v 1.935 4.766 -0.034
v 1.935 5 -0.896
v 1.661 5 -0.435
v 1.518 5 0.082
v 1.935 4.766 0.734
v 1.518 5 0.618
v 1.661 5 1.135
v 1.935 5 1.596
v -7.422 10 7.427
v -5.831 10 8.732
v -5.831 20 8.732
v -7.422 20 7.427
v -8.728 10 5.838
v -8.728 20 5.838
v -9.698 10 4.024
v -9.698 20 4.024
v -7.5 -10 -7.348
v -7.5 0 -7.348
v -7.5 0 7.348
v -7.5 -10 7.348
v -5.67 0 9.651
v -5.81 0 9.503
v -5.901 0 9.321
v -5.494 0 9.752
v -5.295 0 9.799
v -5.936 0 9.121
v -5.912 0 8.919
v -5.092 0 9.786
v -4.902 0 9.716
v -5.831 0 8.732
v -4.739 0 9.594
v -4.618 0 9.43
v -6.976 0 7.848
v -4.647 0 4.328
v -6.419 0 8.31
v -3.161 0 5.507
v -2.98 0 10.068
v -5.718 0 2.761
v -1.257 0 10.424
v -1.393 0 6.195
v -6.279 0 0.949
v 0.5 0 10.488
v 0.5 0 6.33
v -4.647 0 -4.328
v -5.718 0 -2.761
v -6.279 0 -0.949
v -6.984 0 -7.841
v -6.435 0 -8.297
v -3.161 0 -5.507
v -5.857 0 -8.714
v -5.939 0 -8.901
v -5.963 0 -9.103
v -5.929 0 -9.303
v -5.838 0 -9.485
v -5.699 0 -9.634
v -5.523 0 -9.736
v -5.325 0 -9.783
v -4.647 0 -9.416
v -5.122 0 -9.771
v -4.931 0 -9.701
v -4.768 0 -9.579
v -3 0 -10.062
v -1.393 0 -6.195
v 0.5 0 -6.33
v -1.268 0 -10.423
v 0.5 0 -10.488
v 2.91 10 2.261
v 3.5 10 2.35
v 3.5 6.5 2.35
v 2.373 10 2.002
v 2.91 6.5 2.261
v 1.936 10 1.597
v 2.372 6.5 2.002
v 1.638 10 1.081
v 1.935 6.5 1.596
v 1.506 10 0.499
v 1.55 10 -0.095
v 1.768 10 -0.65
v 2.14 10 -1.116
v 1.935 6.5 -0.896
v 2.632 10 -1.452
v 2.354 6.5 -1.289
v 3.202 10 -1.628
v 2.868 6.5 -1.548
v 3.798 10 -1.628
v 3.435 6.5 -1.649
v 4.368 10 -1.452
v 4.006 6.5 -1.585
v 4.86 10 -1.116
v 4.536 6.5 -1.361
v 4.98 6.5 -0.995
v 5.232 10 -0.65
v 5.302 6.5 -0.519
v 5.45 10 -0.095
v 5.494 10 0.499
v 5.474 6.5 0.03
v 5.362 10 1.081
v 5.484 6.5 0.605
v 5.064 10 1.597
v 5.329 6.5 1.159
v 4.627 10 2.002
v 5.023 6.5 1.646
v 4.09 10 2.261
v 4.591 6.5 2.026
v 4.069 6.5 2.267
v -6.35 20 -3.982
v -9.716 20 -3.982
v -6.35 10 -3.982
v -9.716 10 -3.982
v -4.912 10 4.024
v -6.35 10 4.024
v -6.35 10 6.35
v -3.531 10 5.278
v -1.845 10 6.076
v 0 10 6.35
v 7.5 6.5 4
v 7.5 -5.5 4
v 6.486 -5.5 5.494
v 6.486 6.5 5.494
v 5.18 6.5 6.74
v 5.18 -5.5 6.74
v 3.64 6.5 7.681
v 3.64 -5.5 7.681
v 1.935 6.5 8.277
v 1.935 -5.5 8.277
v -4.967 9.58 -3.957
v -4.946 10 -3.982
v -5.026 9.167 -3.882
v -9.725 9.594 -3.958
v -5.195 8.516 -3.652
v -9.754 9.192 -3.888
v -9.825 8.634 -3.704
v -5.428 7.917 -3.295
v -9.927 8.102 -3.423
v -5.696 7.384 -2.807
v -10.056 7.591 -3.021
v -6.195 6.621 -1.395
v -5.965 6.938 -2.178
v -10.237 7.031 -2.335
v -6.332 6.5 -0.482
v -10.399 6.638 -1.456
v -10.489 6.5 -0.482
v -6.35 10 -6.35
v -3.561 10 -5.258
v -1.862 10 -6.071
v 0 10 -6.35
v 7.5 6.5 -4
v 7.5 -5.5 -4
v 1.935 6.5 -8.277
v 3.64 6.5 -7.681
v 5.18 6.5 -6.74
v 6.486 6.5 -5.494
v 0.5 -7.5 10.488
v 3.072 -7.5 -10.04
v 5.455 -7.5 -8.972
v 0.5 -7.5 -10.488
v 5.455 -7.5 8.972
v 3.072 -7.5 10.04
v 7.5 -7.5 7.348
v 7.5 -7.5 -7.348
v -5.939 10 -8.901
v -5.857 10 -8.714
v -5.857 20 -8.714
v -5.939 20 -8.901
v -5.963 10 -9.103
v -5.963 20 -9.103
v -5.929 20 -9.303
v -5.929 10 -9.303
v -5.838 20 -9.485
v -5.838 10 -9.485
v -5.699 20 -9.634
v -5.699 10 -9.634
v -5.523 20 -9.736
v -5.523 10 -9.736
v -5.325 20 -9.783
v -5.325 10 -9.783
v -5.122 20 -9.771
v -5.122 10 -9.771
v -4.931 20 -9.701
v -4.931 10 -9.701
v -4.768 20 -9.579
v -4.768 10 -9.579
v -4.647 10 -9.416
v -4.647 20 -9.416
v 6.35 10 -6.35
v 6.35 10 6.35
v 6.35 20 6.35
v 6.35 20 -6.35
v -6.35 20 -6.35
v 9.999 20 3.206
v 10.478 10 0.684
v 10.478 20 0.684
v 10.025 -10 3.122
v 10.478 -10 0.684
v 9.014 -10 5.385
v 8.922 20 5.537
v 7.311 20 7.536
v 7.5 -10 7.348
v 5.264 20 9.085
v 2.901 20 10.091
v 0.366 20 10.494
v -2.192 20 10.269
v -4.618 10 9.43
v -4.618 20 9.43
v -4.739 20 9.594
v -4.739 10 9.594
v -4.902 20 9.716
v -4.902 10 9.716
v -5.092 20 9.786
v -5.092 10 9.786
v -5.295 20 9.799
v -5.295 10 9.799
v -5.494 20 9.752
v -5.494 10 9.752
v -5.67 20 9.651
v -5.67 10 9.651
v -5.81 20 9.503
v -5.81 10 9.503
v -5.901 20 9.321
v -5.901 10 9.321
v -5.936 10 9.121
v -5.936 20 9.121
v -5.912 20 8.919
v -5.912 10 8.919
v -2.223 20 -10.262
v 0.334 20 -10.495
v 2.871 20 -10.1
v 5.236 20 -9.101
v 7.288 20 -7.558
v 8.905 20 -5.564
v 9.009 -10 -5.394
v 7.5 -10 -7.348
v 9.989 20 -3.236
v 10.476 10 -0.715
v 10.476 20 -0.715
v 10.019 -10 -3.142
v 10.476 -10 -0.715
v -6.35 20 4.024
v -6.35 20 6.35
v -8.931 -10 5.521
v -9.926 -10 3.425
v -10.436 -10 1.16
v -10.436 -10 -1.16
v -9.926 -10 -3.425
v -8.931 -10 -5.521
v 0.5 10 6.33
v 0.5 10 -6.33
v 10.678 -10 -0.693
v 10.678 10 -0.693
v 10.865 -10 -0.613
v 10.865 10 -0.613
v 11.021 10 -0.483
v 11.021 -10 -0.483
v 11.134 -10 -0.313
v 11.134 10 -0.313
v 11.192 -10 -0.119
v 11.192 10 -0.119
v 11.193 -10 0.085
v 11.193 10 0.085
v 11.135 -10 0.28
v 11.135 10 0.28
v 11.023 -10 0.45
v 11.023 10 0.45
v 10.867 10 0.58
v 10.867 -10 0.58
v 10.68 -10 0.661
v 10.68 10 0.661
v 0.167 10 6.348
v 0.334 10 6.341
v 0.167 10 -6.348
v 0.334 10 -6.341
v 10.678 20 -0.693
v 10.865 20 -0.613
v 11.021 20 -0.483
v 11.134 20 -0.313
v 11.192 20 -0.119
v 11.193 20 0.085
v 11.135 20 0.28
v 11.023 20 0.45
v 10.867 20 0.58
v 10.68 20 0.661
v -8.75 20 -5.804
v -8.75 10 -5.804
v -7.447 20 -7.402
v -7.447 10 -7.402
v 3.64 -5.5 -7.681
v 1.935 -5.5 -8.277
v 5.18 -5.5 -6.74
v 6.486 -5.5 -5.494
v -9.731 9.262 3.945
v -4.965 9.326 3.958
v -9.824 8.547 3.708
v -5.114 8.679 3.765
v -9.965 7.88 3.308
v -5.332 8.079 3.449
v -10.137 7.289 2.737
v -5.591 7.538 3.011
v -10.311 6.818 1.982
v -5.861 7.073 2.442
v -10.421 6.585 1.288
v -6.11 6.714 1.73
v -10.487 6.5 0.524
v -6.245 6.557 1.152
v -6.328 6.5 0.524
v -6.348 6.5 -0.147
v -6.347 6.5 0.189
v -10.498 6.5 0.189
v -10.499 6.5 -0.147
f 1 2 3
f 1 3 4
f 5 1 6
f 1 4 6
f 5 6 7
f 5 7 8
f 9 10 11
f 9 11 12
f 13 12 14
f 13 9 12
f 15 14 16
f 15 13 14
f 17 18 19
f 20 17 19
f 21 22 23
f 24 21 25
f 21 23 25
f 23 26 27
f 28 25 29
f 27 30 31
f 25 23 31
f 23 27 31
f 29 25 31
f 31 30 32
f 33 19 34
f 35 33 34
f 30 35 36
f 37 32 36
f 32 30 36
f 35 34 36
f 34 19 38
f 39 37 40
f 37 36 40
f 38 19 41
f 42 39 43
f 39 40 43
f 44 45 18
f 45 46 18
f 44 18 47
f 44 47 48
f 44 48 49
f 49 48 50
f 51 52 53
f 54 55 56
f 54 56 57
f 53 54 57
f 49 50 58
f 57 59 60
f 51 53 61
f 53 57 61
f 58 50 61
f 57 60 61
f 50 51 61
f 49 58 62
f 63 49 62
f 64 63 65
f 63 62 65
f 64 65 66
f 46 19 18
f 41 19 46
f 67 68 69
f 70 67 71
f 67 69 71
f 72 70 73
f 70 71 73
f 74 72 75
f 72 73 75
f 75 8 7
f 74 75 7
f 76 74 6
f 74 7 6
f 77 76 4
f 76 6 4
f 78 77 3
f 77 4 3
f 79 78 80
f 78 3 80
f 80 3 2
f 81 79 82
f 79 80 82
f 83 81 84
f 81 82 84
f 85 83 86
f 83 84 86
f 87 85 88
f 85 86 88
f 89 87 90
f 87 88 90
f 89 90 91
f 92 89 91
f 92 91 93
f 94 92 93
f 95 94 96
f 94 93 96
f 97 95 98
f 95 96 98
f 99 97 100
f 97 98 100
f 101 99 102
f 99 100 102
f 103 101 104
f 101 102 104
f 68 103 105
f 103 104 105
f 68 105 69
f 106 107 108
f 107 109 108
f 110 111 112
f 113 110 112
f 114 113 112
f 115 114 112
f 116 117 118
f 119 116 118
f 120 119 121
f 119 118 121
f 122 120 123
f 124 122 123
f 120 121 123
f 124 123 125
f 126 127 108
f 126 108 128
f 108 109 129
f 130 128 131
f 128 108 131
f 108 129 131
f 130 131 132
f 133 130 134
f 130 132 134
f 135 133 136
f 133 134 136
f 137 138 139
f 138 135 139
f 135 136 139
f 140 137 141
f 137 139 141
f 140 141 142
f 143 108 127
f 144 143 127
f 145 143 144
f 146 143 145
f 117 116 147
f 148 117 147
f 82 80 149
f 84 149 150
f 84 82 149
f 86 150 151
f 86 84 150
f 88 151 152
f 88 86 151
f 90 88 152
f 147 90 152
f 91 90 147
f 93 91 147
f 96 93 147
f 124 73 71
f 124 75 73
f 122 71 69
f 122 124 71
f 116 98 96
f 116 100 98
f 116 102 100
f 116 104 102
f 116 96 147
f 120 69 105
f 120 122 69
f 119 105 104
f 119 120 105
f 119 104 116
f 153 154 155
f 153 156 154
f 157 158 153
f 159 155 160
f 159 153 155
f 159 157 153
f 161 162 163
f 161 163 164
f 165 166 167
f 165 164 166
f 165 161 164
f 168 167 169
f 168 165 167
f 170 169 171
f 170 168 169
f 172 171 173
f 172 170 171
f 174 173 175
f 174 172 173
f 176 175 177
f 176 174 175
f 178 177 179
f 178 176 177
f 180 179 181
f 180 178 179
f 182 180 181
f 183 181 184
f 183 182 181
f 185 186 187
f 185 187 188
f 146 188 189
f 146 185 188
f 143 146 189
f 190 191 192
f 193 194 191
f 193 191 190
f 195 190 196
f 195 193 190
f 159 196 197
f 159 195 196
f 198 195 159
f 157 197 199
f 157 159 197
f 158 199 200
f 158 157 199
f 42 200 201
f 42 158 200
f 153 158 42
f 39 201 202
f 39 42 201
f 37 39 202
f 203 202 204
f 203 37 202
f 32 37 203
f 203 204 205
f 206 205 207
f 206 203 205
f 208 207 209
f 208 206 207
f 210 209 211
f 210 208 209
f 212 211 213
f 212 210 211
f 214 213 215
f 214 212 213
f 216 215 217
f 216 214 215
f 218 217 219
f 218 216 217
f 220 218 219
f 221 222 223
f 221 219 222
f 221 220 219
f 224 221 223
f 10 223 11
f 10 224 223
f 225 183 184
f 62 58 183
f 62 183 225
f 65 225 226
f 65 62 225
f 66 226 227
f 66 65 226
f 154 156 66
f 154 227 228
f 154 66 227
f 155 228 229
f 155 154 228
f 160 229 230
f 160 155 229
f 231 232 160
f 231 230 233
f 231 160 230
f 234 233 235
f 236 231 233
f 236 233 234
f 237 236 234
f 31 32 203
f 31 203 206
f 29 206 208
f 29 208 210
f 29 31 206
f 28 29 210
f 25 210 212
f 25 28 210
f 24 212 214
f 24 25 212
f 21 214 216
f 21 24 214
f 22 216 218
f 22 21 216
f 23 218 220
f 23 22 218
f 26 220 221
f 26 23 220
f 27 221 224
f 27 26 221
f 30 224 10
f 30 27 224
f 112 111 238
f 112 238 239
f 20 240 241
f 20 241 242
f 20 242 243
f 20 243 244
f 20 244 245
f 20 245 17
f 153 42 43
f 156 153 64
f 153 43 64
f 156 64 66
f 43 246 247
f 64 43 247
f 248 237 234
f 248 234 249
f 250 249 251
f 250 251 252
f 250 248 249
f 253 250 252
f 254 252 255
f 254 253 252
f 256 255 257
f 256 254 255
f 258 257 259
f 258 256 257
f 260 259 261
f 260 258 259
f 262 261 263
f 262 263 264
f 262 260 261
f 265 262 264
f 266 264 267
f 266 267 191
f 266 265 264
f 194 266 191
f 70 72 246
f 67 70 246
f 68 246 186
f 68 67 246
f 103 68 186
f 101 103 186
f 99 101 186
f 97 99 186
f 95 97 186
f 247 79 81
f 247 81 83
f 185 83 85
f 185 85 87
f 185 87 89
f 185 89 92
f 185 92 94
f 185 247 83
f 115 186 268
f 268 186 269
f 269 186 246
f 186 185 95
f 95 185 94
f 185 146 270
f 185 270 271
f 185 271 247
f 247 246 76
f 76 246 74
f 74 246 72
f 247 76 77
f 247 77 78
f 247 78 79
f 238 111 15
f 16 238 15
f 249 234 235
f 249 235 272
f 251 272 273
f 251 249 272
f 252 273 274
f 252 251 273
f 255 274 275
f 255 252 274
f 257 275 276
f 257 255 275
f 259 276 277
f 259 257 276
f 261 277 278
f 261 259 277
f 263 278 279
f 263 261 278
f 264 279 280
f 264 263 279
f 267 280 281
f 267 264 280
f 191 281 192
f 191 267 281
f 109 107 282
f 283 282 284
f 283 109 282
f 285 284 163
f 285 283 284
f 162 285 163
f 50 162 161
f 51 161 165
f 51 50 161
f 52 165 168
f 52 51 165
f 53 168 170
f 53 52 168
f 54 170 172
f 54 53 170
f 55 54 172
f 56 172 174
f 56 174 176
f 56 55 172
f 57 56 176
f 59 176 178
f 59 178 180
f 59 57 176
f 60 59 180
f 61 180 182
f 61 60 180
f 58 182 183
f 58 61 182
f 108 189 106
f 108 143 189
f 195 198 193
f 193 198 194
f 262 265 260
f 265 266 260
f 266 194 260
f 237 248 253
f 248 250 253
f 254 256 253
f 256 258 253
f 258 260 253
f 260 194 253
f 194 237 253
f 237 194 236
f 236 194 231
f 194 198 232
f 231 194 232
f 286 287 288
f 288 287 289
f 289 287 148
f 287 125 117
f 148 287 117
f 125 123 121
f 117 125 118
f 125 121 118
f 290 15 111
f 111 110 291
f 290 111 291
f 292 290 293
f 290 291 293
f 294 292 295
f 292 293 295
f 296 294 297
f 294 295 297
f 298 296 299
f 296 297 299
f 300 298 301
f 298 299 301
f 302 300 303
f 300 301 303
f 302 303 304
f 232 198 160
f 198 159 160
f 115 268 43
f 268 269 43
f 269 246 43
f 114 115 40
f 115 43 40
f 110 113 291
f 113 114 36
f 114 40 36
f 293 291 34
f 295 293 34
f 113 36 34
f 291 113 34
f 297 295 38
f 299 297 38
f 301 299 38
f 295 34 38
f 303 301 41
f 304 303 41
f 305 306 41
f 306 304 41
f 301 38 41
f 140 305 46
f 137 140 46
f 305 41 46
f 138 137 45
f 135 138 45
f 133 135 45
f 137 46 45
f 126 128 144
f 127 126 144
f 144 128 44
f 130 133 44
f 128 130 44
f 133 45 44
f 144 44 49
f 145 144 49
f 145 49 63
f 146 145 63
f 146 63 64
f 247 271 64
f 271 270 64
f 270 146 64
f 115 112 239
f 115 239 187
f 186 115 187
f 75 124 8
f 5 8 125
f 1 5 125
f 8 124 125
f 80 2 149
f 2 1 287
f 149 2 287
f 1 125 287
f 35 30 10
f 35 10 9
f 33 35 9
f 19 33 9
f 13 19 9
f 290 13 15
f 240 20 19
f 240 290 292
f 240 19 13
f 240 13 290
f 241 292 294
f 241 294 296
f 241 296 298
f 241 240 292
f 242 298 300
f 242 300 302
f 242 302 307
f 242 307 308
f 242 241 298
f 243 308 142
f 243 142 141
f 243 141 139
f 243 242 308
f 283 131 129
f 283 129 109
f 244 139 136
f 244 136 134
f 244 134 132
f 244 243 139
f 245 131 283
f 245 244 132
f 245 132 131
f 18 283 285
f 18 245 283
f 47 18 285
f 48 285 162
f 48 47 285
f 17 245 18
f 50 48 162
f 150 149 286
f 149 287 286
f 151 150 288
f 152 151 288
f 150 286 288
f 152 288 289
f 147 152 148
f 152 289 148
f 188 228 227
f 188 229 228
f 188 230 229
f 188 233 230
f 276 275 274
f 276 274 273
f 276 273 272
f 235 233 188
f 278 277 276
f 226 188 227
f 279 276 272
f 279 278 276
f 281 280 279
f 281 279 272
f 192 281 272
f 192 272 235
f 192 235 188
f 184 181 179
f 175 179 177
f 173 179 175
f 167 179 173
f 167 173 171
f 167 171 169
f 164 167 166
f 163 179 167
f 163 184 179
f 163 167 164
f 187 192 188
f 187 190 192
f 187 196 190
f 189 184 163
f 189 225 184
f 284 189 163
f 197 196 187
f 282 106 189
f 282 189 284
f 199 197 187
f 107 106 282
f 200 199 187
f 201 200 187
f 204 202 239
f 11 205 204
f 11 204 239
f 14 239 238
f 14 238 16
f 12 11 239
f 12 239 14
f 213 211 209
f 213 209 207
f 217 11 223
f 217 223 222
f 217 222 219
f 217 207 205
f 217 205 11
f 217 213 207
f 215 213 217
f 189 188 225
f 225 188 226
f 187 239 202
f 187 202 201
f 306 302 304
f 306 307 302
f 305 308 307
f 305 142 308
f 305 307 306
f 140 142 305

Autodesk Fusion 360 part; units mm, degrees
sketch "Sketch1" plane through (0, 0, 0) normal (0, 1, 0) x (1, 0, 0) in component "SwitchSpacer"
  arc A0 (-5.8311, -8.732) -> (-5.8573, 8.7145) centre (0, 0) cw
  arc A1 (-4.6183, -9.4298) -> (-5.8311, -8.732) centre (-5.2363, -9.1011) cw
  line L0 (-20, 3.982) -> (0, 3.982)
  arc A2 (10.4756, 0.7154) -> (10.4777, -0.6839) centre (10.5, 0.0158) cw
  arc A3 (-4.6466, 9.4159) -> (10.4756, 0.7154) centre (0, 0) cw
  arc A4 (10.4777, -0.6839) -> (-4.6183, -9.4298) centre (0, 0) cw
  arc A5 (-5.8573, 8.7145) -> (-4.6466, 9.4159) centre (-5.2637, 9.0854) cw
  line L1 (-20, -4.0237) -> (-20, 3.982)
  line L2 (0, 3.982) -> (0, -4.0237)
  line L3 (0, -4.0237) -> (-20, -4.0237)
  circle A6 centre (0, 0) radius 6.35
  line L4 (7.5, 12) -> (-7.5, 12)
  line L5 (-7.5, 12) -> (-7.5, -12)
  line L6 (-7.5, -12) -> (7.5, -12)
  line L7 (7.5, -12) -> (7.5, 12)
  line L8 (7.5, 12) -> (-7.5, -12) construction
  line L9 (-7.5, 12) -> (7.5, -12) construction
  line L10 (0.5, -12) -> (0.5, 12)
  line L11 (2, -12) -> (2, 12)
  point P0 (0.5, -12)
  point P1 (0, -12)
  point P2 (2, -12)
  dimension "d39" = 12.7
  dimension "d40" = 15
  dimension "d41" = 24
  dimension "d42" = 0.5
  dimension "d51" = 1.5
extrude "Extrude8" add sketch "Sketch1" along normal blind 10 contours A0 A1 A4 L3 A6 L5 L10 | A0 L3 L5 | A4 A6 L10 L11 | A0 L0 L5 | A0 L0 A3 A5 A6 L5 L10 | A3 A4 A6 L7 L11 | A6 L10 L11 | A2 A3 A4 L7 | A6 L11 | A3 A6 L10 L11 in component "SwitchSpacer"
sketch "Sketch2" plane through (0, 10, 0) normal (0, 1, 0) x (-1, 0, 0) in component "SwitchSpacer"
  circle A0 centre (0, 0) radius 4
  line L0 (6.35, 6.35) -> (-6.35, 6.35)
  line L1 (-6.35, 6.35) -> (-6.35, -6.35)
  line L2 (-6.35, -6.35) -> (6.35, -6.35)
  line L3 (6.35, -6.35) -> (6.35, 6.35)
  line L4 (6.35, 6.35) -> (-6.35, -6.35) construction
  line L5 (-6.35, 6.35) -> (6.35, -6.35) construction
  line L6 (6.35, 6.35) -> (19.35, 6.35)
  line L7 (19.35, 6.35) -> (19.35, -6.35)
  line L8 (19.35, -6.35) -> (6.35, -6.35)
  line L9 (6.35, -6.35) -> (6.35, 6.35)
  circle A1 centre (0, 0) radius 6.35
  line L10 (12.5, -3.5) -> (-12.5, -3.5)
  line L11 (-12.5, -3.5) -> (-12.5, 3.5)
  line L12 (-12.5, 3.5) -> (12.5, 3.5)
  line L13 (12.5, 3.5) -> (12.5, -3.5)
  line L14 (12.5, -3.5) -> (-12.5, 3.5) construction
  line L15 (-12.5, -3.5) -> (12.5, 3.5) construction
  arc A2 (9.6985, 4.0237) -> (5.8311, 8.732) centre (0, 0) ccw
  arc A3 (5.8311, 8.732) -> (4.6183, 9.4298) centre (5.2363, 9.1011) ccw
  arc A4 (4.6183, 9.4298) -> (-10.4777, 0.6839) centre (0, 0) ccw
  arc A5 (-10.4777, 0.6839) -> (-10.4756, -0.7154) centre (-10.5, -0.0158) ccw
  arc A6 (-10.4756, -0.7154) -> (4.6466, -9.4159) centre (0, 0) ccw
  arc A7 (4.6466, -9.4159) -> (5.8573, -8.7145) centre (5.2637, -9.0854) ccw
  arc A8 (-0.5, -6.3303) -> (4.9463, -3.982) centre (0, 0) ccw
  line L16 (-0.5, -6.3303) -> (-0.5, 6.3303)
  line L17 (9.7156, -3.982) -> (4.9463, -3.982)
  arc A9 (4.9125, 4.0237) -> (-0.5, 6.3303) centre (0, 0) ccw
  line L18 (4.9125, 4.0237) -> (9.6985, 4.0237)
  arc A10 (5.8573, -8.7145) -> (9.7156, -3.982) centre (0, 0) ccw
  dimension "d18" = 12.7
  dimension "d19" = 12.7
  dimension "d20" = 13
  dimension "d21" = 12.7
  dimension "d22" = 12.7
  dimension "d27" = 25
  dimension "d28" = 7
extrude "Extrude10" add sketch "Sketch2" along normal blind 10 contours L0 L1 L6 L12 A2 A3 A4 | L3 L6 L9 A2 L18 | L1 L2 L8 L10 A6 A7 A10 | L3 L8 L9 L17 A10 | L1 L10 L12 A4 A5 A6 in component "SwitchSpacer"
extrude "Extrude12" add sketch "Sketch1" along normal blind 6.5 contours A0 L0 L3 L5 | L0 L3 A6 L5 in component "SwitchSpacer"
extrude "Extrude13" add sketch "Sketch1" against normal blind 10 contours A0 L3 L5 | A0 L0 L3 L5 | A0 L0 L5 | A2 A3 A4 L7 in component "SwitchSpacer"
extrude "Extrude14" add sketch "Sketch1" against normal blind 7.5 contours A4 A6 L10 L11 | A3 A4 A6 L7 L11 | A6 L10 L11 | A6 L11 | A3 A6 L10 L11 in component "SwitchSpacer"
fillet "Fillet1" radius 3.5 2 edges at (-7.331, 6.5, -3.982) (-7.3055, 6.5, 4.0237) in component "SwitchSpacer"
sketch "Sketch3" plane through (0, -7.5, 0) normal (0, -1, 0) x (1, 0, 0) in component "SwitchSpacer"
  line L0 (7.5, -7.3485) -> (7.5, 7.3485)
  arc A0 (7.5, 7.3485) -> (0.5, 10.4881) centre (0, 0) ccw
  line L1 (0.5, 10.4881) -> (0.5, -10.4881)
  arc A1 (0.5, -10.4881) -> (7.5, -7.3485) centre (0, 0) ccw
  circle A2 centre (0, 0) radius 8.5
  line L2 (1.9353, 11.9343) -> (1.9353, -13.1678)
  point P0 (1.9353, 11.9343)
  dimension "d52" = 17
  dimension "d53" = 1.9353
extrude "Extrude15" cut sketch "Sketch3" against normal blind 14 contours L0 A2 L2 in component "SwitchSpacer"
extrude "Extrude16" add sketch "Sketch3" against normal blind 2 contours L0 A2 L2 in component "SwitchSpacer"
hole "Hole2" at (3.5, 10, 0.35) direction (0, -1, 0) diameter 4 depth 5 tip angle 118 in component "SwitchSpacer"
component "SwitchSpacer" placed x (1, 0, 0) y (0, 1, 0) z (0, 0, 1) at (0, 0, 0)
